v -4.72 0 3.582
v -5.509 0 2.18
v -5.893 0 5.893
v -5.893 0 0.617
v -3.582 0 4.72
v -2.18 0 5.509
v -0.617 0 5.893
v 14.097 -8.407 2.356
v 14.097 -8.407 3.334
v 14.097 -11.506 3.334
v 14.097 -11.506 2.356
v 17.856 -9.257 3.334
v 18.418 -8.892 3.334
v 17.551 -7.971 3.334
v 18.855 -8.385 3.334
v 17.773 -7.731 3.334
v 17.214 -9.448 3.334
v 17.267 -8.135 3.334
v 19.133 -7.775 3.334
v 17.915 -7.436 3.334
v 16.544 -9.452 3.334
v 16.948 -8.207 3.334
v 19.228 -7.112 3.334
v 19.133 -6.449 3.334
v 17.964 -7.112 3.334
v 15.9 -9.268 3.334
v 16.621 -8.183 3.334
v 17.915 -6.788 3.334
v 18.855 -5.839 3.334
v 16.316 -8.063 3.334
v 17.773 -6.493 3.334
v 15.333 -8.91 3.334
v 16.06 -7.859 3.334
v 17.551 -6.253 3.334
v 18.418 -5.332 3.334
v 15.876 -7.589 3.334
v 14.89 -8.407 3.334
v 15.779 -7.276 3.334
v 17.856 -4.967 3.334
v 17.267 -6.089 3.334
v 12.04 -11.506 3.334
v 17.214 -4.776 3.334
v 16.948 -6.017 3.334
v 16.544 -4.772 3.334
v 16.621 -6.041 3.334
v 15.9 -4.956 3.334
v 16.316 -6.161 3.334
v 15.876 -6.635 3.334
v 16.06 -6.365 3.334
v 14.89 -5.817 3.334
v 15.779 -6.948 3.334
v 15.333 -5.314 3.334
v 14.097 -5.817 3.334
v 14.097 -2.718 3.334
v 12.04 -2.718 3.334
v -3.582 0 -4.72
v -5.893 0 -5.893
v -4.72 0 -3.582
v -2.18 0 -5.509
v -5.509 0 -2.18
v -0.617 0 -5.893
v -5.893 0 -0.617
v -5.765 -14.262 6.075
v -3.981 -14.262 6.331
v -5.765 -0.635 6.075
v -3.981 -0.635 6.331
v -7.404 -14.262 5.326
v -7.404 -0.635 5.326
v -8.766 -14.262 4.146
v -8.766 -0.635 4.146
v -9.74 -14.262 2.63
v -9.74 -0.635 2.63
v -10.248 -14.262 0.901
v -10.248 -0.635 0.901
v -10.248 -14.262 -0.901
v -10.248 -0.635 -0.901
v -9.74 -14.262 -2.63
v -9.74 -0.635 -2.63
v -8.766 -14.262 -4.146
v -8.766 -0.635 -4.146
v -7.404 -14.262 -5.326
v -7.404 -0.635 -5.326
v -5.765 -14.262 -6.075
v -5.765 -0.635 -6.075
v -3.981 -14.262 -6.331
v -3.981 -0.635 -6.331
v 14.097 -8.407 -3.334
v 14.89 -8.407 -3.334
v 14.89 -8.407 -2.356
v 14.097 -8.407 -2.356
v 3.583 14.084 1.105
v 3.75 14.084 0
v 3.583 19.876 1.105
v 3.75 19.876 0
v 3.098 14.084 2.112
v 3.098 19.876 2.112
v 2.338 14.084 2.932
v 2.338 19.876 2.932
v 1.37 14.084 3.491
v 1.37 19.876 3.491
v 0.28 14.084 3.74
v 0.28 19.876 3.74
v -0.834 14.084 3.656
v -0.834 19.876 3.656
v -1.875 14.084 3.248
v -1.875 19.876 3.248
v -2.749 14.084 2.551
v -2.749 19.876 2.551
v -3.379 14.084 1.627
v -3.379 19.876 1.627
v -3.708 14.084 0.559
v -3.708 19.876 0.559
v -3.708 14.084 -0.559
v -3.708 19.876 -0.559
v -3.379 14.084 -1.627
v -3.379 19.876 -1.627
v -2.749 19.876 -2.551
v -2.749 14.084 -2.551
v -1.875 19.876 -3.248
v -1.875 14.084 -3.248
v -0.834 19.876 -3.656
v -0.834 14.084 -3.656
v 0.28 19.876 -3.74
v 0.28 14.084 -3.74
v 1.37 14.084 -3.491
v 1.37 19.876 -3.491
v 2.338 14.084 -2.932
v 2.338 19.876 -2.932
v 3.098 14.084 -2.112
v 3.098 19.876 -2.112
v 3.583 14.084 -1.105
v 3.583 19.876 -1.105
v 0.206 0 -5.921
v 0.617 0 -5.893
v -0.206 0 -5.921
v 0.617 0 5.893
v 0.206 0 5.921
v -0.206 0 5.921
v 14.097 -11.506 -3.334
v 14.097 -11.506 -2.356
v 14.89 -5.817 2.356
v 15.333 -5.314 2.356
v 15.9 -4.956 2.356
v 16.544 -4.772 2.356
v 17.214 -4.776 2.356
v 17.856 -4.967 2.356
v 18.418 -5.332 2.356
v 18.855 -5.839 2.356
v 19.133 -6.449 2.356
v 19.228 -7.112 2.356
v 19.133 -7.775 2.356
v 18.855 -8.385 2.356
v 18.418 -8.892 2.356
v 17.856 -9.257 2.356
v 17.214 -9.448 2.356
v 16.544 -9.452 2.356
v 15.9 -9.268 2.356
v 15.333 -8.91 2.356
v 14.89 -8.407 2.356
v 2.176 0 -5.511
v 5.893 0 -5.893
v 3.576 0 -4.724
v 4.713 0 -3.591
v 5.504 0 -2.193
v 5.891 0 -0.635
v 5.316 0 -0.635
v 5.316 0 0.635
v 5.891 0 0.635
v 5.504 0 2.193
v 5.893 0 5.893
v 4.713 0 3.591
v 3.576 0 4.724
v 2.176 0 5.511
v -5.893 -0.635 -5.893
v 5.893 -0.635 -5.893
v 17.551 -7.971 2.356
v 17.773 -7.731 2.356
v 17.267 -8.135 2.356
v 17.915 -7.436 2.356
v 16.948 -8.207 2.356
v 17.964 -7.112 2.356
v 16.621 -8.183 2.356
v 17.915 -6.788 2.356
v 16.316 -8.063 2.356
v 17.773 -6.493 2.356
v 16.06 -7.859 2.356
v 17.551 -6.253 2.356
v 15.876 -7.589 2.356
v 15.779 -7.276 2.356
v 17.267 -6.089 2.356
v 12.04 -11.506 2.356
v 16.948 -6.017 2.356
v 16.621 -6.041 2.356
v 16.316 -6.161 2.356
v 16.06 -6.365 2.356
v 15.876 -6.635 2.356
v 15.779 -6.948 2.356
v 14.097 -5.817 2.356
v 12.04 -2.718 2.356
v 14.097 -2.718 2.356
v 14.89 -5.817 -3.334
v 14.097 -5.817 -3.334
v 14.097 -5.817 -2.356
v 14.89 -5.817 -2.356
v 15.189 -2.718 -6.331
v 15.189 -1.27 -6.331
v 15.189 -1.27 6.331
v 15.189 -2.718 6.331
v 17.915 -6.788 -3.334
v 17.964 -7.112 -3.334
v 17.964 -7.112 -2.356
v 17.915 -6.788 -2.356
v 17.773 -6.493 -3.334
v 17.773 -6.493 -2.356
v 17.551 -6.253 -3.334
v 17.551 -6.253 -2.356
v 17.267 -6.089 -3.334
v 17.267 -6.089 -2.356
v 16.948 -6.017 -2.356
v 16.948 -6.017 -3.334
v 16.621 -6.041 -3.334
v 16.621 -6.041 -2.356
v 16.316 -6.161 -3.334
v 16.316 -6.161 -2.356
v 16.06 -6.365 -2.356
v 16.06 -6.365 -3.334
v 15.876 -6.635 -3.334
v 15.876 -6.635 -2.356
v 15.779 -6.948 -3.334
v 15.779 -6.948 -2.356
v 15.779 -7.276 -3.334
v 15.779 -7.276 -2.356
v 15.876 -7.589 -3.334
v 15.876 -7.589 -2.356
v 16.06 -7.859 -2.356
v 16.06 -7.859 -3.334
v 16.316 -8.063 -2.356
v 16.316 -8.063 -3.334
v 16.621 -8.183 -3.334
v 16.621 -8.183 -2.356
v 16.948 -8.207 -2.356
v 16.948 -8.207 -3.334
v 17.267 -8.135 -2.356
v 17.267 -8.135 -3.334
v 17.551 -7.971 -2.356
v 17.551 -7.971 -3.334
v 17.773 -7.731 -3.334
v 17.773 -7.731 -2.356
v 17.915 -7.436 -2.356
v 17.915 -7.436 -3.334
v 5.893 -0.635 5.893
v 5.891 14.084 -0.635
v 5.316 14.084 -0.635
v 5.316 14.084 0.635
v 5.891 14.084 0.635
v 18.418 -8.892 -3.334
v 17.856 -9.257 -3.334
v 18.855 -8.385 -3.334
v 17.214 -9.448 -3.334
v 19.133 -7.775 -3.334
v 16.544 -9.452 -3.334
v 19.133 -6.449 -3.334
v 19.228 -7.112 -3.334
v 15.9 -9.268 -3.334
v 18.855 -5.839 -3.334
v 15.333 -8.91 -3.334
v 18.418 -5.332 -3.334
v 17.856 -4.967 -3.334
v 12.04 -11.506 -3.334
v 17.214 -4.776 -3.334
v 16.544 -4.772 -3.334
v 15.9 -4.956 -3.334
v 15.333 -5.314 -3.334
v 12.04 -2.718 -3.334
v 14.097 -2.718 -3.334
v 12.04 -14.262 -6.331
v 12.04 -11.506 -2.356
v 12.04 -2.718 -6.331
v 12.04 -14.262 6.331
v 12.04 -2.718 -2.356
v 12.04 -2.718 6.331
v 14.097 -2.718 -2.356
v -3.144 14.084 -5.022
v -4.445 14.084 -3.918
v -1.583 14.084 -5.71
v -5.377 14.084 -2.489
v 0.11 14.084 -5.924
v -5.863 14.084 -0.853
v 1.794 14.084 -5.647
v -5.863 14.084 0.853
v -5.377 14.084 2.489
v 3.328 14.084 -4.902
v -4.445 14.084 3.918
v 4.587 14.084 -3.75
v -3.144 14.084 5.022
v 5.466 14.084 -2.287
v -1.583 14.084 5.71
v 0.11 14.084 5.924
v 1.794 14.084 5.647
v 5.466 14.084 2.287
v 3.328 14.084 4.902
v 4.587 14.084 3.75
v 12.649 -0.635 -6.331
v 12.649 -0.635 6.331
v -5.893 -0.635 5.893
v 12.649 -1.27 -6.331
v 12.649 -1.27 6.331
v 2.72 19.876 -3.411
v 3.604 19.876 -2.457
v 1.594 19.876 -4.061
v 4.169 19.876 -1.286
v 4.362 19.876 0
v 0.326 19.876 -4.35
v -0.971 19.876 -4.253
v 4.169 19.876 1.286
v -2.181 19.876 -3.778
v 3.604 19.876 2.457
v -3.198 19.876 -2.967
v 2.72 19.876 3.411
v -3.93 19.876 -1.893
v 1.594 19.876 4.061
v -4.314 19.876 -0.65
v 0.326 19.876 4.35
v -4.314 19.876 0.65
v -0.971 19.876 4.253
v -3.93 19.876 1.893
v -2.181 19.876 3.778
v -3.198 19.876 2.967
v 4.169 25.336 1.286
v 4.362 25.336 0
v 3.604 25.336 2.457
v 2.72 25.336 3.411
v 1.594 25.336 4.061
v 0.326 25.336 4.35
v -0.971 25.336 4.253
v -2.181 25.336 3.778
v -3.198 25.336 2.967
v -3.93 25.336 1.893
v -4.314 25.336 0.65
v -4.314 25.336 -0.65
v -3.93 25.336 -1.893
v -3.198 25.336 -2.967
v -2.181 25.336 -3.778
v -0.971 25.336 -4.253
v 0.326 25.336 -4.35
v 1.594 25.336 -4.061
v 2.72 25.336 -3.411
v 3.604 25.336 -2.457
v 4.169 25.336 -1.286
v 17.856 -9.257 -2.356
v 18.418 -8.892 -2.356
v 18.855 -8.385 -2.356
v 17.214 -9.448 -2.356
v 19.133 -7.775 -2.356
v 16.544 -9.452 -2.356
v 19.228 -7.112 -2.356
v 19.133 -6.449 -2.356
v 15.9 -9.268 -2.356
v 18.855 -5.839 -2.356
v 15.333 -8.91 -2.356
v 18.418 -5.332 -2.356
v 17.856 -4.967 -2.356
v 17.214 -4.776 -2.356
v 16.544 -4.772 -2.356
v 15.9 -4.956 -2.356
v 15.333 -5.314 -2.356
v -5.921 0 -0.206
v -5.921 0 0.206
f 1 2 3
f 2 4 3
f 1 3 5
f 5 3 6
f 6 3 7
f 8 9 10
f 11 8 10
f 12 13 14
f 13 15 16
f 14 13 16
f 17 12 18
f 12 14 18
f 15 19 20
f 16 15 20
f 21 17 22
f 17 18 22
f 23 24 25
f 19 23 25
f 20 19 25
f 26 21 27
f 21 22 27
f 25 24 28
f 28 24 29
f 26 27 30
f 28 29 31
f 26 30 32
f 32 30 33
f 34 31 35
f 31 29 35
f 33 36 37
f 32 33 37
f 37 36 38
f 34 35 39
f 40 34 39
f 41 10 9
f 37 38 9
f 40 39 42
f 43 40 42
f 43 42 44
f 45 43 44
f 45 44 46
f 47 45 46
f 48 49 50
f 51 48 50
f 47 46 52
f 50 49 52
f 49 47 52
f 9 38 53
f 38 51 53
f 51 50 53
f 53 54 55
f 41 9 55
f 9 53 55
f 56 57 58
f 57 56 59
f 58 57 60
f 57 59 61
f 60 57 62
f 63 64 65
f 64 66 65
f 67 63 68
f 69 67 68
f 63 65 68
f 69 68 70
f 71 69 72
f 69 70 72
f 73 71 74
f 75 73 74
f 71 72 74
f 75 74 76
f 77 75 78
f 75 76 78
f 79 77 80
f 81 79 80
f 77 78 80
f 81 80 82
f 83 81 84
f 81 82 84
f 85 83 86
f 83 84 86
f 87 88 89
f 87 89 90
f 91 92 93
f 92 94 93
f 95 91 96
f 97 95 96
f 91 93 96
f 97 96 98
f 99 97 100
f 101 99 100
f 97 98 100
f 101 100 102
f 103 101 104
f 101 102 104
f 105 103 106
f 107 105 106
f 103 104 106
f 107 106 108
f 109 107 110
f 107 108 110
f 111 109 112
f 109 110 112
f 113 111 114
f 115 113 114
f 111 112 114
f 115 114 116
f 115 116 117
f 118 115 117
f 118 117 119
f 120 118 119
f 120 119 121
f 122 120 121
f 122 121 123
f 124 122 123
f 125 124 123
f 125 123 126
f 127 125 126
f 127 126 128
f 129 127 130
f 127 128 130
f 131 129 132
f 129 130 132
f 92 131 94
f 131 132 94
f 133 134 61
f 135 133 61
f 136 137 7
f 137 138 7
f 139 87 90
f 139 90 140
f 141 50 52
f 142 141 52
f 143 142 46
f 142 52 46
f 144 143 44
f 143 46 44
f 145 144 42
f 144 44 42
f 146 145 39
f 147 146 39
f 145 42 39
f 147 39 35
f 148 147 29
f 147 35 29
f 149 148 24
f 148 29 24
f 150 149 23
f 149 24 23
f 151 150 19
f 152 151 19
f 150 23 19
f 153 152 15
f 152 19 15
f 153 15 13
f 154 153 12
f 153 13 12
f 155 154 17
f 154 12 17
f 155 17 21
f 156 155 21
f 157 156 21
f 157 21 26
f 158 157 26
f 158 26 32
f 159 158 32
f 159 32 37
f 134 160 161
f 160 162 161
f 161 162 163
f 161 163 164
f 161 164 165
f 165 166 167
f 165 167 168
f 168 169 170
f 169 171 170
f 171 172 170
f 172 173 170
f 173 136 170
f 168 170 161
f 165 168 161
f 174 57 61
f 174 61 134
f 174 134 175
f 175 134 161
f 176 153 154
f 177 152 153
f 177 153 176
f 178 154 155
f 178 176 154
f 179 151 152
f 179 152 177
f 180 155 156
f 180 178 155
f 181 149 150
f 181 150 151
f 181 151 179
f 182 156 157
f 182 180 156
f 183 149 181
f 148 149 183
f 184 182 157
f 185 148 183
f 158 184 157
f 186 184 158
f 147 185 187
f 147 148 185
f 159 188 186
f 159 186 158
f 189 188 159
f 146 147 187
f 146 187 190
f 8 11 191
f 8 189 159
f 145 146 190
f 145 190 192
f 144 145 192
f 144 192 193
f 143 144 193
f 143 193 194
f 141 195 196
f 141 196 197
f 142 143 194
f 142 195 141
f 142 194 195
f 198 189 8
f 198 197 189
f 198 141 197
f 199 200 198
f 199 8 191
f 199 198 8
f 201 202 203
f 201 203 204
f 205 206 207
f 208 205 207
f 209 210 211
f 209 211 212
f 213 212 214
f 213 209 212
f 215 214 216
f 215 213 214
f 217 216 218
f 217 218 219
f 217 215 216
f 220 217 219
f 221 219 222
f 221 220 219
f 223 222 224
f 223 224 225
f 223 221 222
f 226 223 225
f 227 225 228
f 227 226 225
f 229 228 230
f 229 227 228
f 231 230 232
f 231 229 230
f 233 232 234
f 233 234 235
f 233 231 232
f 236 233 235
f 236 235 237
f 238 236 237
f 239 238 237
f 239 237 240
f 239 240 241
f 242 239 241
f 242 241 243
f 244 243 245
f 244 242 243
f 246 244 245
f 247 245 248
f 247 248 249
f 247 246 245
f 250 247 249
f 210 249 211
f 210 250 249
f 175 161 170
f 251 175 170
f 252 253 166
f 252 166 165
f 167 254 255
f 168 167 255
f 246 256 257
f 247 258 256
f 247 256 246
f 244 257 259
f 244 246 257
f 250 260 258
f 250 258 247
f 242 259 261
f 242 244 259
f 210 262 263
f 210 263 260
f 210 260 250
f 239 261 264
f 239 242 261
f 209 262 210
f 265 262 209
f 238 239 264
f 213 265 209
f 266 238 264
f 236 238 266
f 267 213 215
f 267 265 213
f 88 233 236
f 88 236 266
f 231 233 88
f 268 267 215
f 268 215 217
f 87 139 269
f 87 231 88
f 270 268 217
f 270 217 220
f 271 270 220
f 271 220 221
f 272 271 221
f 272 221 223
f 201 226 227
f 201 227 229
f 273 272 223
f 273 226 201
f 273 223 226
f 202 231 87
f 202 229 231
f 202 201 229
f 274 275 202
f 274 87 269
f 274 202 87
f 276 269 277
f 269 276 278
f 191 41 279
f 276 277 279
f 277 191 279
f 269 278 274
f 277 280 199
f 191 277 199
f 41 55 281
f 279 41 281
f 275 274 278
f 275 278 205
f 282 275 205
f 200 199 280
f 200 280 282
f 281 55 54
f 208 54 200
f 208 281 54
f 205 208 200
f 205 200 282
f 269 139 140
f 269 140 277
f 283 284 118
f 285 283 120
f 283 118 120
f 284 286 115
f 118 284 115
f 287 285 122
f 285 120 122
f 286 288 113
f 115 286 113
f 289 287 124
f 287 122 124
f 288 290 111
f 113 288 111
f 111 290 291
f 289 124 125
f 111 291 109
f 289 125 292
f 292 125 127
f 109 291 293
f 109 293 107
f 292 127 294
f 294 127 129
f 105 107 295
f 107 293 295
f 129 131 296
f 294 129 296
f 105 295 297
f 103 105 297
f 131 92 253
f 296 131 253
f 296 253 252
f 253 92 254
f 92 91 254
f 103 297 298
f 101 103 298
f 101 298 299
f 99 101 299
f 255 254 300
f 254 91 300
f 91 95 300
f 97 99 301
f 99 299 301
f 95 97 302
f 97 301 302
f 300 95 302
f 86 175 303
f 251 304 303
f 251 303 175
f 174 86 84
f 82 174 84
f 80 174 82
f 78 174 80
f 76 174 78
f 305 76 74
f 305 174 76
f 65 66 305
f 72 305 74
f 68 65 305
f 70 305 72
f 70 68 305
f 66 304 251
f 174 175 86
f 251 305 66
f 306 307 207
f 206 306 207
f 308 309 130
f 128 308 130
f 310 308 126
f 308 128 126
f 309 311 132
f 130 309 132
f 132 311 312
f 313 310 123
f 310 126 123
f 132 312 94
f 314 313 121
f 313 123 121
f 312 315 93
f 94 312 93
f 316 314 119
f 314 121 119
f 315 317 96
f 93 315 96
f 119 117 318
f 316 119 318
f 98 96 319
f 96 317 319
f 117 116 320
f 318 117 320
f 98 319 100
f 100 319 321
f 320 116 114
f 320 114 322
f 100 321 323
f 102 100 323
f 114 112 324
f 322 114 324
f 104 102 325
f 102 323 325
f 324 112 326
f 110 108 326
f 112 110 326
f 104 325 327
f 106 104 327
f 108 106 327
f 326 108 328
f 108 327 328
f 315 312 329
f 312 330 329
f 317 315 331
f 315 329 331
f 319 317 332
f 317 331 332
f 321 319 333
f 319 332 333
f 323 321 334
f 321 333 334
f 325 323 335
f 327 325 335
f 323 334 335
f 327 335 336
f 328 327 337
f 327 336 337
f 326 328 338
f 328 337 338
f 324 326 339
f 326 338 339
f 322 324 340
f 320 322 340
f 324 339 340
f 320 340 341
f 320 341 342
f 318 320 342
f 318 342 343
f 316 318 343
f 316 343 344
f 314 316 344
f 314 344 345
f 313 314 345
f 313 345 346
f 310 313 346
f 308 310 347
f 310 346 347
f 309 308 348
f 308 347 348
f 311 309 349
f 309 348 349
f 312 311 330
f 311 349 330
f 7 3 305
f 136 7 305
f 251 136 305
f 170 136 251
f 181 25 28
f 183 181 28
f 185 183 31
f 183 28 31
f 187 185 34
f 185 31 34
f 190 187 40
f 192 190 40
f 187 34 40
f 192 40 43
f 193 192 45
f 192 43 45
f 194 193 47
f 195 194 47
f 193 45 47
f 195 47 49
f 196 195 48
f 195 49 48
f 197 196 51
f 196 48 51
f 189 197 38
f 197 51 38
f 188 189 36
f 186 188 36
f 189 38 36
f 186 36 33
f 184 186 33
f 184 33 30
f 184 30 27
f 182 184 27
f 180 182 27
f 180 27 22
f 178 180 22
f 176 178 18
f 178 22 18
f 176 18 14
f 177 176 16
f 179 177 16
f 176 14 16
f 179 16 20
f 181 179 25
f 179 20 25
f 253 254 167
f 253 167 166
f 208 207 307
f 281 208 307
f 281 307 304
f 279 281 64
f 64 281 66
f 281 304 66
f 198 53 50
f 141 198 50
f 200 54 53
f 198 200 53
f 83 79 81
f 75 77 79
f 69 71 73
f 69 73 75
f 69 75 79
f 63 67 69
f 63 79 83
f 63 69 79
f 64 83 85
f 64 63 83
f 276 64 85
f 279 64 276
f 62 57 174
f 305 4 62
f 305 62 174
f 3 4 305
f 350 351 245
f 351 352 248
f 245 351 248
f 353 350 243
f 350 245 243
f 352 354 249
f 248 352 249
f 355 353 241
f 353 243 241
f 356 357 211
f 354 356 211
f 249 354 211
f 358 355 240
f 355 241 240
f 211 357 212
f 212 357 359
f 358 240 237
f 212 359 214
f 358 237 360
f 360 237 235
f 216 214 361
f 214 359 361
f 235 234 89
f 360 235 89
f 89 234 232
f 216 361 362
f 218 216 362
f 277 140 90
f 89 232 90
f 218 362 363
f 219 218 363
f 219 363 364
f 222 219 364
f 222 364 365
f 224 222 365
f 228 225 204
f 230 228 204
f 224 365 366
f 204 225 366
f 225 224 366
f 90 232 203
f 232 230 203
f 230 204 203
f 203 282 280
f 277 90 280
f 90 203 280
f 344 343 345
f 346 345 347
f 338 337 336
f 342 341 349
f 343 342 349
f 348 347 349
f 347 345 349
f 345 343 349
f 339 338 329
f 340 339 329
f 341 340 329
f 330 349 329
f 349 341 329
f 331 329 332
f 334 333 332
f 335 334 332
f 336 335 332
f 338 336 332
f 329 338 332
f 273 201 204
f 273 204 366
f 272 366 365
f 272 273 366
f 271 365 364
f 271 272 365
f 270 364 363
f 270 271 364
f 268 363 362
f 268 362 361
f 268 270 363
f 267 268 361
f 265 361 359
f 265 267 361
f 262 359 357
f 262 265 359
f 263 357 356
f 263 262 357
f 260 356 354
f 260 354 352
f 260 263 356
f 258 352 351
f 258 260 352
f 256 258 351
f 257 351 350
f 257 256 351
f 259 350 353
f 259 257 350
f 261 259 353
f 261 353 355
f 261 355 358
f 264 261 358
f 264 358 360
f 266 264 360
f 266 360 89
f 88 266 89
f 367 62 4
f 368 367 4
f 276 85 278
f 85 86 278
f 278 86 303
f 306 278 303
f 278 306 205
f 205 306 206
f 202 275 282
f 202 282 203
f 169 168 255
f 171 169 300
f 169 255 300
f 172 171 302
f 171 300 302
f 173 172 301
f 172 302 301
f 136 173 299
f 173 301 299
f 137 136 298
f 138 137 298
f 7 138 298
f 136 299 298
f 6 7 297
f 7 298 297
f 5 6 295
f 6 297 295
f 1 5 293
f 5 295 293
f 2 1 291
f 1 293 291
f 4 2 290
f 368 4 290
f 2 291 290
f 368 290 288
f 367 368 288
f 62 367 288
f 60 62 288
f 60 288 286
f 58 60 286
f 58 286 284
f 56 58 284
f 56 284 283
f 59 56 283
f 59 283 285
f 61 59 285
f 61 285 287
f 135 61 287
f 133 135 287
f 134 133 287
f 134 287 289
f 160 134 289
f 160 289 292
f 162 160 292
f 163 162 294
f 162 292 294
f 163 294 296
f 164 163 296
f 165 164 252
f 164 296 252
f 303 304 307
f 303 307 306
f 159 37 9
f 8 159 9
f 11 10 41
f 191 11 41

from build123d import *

# Parameters (mm, degrees)
SKETCH2_W           = 11.7856
SKETCH2_H           = 11.7856
BOSS_EXTRUDE1_DEPTH = 0.635
BOSS_EXTRUDE2_DEPTH = 0.635
BOSS_EXTRUDE3_DEPTH = 1.4478
BOSS_EXTRUDE4_DEPTH = 11.5443
SKETCH6_R           = 1.09855
BOSS_EXTRUDE5_DEPTH = 0.9779
SKETCH7_W           = 1.509743552
SKETCH7_H           = 1.27
CUT_EXTRUDE1_DEPTH  = 14.0843


with BuildPart() as part:
    # Sketch1 → Revolve1 (revolve)
    with BuildSketch(Plane.XY):
        Polygon((0, 0), (5.925, 0), (5.925, 14.0843), (3.75, 14.0843), (3.75, 19.8755), (4.36245, 19.8755), (4.36245, 25.3365), (0, 25.3365), align=None)
    revolve(axis=Axis((0, 31.195966839, 0), (0, -1, 0)))

    # Sketch2 → Boss-Extrude1 (add)
    with BuildSketch(Plane.XZ):
        Rectangle(SKETCH2_W, SKETCH2_H)
    extrude(amount=BOSS_EXTRUDE1_DEPTH)

    # Sketch3 → Boss-Extrude2 (add)
    with BuildSketch(Plane.XZ.offset(0.635)):
        with BuildLine():
            Line((-3.98145, 6.33095), (12.6492, 6.33095))
            Line((12.6492, 6.33095), (12.6492, -6.33095))
            Line((12.6492, -6.33095), (-3.98145, -6.33095))
            ThreePointArc((-3.98145, -6.33095), (-10.3124, 0), (-3.98145, 6.33095))
        make_face()
    extrude(amount=BOSS_EXTRUDE2_DEPTH)

    # Sketch4 → Boss-Extrude3 (add)
    with BuildSketch(Plane.XZ.offset(1.27)):
        with BuildLine():
            Line((-3.98145, -6.33095), (15.1892, -6.33095))
            Line((15.1892, -6.33095), (15.1892, 6.33095))
            Line((15.1892, 6.33095), (-3.98145, 6.33095))
            ThreePointArc((-3.98145, 6.33095), (-10.3124, 0), (-3.98145, -6.33095))
        make_face()
    extrude(amount=BOSS_EXTRUDE3_DEPTH)

    # Sketch5 → Boss-Extrude4 (add)
    with BuildSketch(Plane.XZ.offset(2.7178)):
        with BuildLine():
            Line((12.0396, 6.33095), (-3.98145, 6.33095))
            ThreePointArc((-3.98145, 6.33095), (-10.3124, 0), (-3.98145, -6.33095))
            Line((-3.98145, -6.33095), (12.0396, -6.33095))
            Line((12.0396, -6.33095), (12.0396, 6.33095))
        make_face()
    extrude(amount=BOSS_EXTRUDE4_DEPTH)

    # Sketch6 → Boss-Extrude5 (add)
    with BuildSketch(Plane.XY.offset(3.33375)):
        with BuildLine():
            Line((14.097, -8.4074), (14.097, -11.5062))
            Line((14.097, -11.5062), (12.0396, -11.5062))
            Line((12.0396, -11.5062), (12.0396, -2.7178))
            Line((12.0396, -2.7178), (14.097, -2.7178))
            Line((14.097, -2.7178), (14.097, -5.8166))
            Line((14.097, -5.8166), (14.890270235, -5.8166))
            ThreePointArc((14.890270235, -5.8166), (19.2278, -7.112), (14.890270235, -8.4074))
            Line((14.890270235, -8.4074), (14.097, -8.4074))
        make_face()
        with Locations((16.8656, -7.112)):
            Circle(SKETCH6_R, mode=Mode.SUBTRACT)
    boss_extrude5 = extrude(amount=-BOSS_EXTRUDE5_DEPTH)

    # Mirror1: Boss-Extrude5 across plane
    add(boss_extrude5.mirror(Plane.XY))

    # Sketch7 → Cut-Extrude1 (cut)
    with BuildSketch(Plane(origin=(0, 14.0843, 0), x_dir=(1, 0, 0), z_dir=(0, 1, 0))):
        with Locations((6.070418397, 0)):
            Rectangle(SKETCH7_W, SKETCH7_H)
    extrude(amount=-CUT_EXTRUDE1_DEPTH, mode=Mode.SUBTRACT)


solid = part.part
